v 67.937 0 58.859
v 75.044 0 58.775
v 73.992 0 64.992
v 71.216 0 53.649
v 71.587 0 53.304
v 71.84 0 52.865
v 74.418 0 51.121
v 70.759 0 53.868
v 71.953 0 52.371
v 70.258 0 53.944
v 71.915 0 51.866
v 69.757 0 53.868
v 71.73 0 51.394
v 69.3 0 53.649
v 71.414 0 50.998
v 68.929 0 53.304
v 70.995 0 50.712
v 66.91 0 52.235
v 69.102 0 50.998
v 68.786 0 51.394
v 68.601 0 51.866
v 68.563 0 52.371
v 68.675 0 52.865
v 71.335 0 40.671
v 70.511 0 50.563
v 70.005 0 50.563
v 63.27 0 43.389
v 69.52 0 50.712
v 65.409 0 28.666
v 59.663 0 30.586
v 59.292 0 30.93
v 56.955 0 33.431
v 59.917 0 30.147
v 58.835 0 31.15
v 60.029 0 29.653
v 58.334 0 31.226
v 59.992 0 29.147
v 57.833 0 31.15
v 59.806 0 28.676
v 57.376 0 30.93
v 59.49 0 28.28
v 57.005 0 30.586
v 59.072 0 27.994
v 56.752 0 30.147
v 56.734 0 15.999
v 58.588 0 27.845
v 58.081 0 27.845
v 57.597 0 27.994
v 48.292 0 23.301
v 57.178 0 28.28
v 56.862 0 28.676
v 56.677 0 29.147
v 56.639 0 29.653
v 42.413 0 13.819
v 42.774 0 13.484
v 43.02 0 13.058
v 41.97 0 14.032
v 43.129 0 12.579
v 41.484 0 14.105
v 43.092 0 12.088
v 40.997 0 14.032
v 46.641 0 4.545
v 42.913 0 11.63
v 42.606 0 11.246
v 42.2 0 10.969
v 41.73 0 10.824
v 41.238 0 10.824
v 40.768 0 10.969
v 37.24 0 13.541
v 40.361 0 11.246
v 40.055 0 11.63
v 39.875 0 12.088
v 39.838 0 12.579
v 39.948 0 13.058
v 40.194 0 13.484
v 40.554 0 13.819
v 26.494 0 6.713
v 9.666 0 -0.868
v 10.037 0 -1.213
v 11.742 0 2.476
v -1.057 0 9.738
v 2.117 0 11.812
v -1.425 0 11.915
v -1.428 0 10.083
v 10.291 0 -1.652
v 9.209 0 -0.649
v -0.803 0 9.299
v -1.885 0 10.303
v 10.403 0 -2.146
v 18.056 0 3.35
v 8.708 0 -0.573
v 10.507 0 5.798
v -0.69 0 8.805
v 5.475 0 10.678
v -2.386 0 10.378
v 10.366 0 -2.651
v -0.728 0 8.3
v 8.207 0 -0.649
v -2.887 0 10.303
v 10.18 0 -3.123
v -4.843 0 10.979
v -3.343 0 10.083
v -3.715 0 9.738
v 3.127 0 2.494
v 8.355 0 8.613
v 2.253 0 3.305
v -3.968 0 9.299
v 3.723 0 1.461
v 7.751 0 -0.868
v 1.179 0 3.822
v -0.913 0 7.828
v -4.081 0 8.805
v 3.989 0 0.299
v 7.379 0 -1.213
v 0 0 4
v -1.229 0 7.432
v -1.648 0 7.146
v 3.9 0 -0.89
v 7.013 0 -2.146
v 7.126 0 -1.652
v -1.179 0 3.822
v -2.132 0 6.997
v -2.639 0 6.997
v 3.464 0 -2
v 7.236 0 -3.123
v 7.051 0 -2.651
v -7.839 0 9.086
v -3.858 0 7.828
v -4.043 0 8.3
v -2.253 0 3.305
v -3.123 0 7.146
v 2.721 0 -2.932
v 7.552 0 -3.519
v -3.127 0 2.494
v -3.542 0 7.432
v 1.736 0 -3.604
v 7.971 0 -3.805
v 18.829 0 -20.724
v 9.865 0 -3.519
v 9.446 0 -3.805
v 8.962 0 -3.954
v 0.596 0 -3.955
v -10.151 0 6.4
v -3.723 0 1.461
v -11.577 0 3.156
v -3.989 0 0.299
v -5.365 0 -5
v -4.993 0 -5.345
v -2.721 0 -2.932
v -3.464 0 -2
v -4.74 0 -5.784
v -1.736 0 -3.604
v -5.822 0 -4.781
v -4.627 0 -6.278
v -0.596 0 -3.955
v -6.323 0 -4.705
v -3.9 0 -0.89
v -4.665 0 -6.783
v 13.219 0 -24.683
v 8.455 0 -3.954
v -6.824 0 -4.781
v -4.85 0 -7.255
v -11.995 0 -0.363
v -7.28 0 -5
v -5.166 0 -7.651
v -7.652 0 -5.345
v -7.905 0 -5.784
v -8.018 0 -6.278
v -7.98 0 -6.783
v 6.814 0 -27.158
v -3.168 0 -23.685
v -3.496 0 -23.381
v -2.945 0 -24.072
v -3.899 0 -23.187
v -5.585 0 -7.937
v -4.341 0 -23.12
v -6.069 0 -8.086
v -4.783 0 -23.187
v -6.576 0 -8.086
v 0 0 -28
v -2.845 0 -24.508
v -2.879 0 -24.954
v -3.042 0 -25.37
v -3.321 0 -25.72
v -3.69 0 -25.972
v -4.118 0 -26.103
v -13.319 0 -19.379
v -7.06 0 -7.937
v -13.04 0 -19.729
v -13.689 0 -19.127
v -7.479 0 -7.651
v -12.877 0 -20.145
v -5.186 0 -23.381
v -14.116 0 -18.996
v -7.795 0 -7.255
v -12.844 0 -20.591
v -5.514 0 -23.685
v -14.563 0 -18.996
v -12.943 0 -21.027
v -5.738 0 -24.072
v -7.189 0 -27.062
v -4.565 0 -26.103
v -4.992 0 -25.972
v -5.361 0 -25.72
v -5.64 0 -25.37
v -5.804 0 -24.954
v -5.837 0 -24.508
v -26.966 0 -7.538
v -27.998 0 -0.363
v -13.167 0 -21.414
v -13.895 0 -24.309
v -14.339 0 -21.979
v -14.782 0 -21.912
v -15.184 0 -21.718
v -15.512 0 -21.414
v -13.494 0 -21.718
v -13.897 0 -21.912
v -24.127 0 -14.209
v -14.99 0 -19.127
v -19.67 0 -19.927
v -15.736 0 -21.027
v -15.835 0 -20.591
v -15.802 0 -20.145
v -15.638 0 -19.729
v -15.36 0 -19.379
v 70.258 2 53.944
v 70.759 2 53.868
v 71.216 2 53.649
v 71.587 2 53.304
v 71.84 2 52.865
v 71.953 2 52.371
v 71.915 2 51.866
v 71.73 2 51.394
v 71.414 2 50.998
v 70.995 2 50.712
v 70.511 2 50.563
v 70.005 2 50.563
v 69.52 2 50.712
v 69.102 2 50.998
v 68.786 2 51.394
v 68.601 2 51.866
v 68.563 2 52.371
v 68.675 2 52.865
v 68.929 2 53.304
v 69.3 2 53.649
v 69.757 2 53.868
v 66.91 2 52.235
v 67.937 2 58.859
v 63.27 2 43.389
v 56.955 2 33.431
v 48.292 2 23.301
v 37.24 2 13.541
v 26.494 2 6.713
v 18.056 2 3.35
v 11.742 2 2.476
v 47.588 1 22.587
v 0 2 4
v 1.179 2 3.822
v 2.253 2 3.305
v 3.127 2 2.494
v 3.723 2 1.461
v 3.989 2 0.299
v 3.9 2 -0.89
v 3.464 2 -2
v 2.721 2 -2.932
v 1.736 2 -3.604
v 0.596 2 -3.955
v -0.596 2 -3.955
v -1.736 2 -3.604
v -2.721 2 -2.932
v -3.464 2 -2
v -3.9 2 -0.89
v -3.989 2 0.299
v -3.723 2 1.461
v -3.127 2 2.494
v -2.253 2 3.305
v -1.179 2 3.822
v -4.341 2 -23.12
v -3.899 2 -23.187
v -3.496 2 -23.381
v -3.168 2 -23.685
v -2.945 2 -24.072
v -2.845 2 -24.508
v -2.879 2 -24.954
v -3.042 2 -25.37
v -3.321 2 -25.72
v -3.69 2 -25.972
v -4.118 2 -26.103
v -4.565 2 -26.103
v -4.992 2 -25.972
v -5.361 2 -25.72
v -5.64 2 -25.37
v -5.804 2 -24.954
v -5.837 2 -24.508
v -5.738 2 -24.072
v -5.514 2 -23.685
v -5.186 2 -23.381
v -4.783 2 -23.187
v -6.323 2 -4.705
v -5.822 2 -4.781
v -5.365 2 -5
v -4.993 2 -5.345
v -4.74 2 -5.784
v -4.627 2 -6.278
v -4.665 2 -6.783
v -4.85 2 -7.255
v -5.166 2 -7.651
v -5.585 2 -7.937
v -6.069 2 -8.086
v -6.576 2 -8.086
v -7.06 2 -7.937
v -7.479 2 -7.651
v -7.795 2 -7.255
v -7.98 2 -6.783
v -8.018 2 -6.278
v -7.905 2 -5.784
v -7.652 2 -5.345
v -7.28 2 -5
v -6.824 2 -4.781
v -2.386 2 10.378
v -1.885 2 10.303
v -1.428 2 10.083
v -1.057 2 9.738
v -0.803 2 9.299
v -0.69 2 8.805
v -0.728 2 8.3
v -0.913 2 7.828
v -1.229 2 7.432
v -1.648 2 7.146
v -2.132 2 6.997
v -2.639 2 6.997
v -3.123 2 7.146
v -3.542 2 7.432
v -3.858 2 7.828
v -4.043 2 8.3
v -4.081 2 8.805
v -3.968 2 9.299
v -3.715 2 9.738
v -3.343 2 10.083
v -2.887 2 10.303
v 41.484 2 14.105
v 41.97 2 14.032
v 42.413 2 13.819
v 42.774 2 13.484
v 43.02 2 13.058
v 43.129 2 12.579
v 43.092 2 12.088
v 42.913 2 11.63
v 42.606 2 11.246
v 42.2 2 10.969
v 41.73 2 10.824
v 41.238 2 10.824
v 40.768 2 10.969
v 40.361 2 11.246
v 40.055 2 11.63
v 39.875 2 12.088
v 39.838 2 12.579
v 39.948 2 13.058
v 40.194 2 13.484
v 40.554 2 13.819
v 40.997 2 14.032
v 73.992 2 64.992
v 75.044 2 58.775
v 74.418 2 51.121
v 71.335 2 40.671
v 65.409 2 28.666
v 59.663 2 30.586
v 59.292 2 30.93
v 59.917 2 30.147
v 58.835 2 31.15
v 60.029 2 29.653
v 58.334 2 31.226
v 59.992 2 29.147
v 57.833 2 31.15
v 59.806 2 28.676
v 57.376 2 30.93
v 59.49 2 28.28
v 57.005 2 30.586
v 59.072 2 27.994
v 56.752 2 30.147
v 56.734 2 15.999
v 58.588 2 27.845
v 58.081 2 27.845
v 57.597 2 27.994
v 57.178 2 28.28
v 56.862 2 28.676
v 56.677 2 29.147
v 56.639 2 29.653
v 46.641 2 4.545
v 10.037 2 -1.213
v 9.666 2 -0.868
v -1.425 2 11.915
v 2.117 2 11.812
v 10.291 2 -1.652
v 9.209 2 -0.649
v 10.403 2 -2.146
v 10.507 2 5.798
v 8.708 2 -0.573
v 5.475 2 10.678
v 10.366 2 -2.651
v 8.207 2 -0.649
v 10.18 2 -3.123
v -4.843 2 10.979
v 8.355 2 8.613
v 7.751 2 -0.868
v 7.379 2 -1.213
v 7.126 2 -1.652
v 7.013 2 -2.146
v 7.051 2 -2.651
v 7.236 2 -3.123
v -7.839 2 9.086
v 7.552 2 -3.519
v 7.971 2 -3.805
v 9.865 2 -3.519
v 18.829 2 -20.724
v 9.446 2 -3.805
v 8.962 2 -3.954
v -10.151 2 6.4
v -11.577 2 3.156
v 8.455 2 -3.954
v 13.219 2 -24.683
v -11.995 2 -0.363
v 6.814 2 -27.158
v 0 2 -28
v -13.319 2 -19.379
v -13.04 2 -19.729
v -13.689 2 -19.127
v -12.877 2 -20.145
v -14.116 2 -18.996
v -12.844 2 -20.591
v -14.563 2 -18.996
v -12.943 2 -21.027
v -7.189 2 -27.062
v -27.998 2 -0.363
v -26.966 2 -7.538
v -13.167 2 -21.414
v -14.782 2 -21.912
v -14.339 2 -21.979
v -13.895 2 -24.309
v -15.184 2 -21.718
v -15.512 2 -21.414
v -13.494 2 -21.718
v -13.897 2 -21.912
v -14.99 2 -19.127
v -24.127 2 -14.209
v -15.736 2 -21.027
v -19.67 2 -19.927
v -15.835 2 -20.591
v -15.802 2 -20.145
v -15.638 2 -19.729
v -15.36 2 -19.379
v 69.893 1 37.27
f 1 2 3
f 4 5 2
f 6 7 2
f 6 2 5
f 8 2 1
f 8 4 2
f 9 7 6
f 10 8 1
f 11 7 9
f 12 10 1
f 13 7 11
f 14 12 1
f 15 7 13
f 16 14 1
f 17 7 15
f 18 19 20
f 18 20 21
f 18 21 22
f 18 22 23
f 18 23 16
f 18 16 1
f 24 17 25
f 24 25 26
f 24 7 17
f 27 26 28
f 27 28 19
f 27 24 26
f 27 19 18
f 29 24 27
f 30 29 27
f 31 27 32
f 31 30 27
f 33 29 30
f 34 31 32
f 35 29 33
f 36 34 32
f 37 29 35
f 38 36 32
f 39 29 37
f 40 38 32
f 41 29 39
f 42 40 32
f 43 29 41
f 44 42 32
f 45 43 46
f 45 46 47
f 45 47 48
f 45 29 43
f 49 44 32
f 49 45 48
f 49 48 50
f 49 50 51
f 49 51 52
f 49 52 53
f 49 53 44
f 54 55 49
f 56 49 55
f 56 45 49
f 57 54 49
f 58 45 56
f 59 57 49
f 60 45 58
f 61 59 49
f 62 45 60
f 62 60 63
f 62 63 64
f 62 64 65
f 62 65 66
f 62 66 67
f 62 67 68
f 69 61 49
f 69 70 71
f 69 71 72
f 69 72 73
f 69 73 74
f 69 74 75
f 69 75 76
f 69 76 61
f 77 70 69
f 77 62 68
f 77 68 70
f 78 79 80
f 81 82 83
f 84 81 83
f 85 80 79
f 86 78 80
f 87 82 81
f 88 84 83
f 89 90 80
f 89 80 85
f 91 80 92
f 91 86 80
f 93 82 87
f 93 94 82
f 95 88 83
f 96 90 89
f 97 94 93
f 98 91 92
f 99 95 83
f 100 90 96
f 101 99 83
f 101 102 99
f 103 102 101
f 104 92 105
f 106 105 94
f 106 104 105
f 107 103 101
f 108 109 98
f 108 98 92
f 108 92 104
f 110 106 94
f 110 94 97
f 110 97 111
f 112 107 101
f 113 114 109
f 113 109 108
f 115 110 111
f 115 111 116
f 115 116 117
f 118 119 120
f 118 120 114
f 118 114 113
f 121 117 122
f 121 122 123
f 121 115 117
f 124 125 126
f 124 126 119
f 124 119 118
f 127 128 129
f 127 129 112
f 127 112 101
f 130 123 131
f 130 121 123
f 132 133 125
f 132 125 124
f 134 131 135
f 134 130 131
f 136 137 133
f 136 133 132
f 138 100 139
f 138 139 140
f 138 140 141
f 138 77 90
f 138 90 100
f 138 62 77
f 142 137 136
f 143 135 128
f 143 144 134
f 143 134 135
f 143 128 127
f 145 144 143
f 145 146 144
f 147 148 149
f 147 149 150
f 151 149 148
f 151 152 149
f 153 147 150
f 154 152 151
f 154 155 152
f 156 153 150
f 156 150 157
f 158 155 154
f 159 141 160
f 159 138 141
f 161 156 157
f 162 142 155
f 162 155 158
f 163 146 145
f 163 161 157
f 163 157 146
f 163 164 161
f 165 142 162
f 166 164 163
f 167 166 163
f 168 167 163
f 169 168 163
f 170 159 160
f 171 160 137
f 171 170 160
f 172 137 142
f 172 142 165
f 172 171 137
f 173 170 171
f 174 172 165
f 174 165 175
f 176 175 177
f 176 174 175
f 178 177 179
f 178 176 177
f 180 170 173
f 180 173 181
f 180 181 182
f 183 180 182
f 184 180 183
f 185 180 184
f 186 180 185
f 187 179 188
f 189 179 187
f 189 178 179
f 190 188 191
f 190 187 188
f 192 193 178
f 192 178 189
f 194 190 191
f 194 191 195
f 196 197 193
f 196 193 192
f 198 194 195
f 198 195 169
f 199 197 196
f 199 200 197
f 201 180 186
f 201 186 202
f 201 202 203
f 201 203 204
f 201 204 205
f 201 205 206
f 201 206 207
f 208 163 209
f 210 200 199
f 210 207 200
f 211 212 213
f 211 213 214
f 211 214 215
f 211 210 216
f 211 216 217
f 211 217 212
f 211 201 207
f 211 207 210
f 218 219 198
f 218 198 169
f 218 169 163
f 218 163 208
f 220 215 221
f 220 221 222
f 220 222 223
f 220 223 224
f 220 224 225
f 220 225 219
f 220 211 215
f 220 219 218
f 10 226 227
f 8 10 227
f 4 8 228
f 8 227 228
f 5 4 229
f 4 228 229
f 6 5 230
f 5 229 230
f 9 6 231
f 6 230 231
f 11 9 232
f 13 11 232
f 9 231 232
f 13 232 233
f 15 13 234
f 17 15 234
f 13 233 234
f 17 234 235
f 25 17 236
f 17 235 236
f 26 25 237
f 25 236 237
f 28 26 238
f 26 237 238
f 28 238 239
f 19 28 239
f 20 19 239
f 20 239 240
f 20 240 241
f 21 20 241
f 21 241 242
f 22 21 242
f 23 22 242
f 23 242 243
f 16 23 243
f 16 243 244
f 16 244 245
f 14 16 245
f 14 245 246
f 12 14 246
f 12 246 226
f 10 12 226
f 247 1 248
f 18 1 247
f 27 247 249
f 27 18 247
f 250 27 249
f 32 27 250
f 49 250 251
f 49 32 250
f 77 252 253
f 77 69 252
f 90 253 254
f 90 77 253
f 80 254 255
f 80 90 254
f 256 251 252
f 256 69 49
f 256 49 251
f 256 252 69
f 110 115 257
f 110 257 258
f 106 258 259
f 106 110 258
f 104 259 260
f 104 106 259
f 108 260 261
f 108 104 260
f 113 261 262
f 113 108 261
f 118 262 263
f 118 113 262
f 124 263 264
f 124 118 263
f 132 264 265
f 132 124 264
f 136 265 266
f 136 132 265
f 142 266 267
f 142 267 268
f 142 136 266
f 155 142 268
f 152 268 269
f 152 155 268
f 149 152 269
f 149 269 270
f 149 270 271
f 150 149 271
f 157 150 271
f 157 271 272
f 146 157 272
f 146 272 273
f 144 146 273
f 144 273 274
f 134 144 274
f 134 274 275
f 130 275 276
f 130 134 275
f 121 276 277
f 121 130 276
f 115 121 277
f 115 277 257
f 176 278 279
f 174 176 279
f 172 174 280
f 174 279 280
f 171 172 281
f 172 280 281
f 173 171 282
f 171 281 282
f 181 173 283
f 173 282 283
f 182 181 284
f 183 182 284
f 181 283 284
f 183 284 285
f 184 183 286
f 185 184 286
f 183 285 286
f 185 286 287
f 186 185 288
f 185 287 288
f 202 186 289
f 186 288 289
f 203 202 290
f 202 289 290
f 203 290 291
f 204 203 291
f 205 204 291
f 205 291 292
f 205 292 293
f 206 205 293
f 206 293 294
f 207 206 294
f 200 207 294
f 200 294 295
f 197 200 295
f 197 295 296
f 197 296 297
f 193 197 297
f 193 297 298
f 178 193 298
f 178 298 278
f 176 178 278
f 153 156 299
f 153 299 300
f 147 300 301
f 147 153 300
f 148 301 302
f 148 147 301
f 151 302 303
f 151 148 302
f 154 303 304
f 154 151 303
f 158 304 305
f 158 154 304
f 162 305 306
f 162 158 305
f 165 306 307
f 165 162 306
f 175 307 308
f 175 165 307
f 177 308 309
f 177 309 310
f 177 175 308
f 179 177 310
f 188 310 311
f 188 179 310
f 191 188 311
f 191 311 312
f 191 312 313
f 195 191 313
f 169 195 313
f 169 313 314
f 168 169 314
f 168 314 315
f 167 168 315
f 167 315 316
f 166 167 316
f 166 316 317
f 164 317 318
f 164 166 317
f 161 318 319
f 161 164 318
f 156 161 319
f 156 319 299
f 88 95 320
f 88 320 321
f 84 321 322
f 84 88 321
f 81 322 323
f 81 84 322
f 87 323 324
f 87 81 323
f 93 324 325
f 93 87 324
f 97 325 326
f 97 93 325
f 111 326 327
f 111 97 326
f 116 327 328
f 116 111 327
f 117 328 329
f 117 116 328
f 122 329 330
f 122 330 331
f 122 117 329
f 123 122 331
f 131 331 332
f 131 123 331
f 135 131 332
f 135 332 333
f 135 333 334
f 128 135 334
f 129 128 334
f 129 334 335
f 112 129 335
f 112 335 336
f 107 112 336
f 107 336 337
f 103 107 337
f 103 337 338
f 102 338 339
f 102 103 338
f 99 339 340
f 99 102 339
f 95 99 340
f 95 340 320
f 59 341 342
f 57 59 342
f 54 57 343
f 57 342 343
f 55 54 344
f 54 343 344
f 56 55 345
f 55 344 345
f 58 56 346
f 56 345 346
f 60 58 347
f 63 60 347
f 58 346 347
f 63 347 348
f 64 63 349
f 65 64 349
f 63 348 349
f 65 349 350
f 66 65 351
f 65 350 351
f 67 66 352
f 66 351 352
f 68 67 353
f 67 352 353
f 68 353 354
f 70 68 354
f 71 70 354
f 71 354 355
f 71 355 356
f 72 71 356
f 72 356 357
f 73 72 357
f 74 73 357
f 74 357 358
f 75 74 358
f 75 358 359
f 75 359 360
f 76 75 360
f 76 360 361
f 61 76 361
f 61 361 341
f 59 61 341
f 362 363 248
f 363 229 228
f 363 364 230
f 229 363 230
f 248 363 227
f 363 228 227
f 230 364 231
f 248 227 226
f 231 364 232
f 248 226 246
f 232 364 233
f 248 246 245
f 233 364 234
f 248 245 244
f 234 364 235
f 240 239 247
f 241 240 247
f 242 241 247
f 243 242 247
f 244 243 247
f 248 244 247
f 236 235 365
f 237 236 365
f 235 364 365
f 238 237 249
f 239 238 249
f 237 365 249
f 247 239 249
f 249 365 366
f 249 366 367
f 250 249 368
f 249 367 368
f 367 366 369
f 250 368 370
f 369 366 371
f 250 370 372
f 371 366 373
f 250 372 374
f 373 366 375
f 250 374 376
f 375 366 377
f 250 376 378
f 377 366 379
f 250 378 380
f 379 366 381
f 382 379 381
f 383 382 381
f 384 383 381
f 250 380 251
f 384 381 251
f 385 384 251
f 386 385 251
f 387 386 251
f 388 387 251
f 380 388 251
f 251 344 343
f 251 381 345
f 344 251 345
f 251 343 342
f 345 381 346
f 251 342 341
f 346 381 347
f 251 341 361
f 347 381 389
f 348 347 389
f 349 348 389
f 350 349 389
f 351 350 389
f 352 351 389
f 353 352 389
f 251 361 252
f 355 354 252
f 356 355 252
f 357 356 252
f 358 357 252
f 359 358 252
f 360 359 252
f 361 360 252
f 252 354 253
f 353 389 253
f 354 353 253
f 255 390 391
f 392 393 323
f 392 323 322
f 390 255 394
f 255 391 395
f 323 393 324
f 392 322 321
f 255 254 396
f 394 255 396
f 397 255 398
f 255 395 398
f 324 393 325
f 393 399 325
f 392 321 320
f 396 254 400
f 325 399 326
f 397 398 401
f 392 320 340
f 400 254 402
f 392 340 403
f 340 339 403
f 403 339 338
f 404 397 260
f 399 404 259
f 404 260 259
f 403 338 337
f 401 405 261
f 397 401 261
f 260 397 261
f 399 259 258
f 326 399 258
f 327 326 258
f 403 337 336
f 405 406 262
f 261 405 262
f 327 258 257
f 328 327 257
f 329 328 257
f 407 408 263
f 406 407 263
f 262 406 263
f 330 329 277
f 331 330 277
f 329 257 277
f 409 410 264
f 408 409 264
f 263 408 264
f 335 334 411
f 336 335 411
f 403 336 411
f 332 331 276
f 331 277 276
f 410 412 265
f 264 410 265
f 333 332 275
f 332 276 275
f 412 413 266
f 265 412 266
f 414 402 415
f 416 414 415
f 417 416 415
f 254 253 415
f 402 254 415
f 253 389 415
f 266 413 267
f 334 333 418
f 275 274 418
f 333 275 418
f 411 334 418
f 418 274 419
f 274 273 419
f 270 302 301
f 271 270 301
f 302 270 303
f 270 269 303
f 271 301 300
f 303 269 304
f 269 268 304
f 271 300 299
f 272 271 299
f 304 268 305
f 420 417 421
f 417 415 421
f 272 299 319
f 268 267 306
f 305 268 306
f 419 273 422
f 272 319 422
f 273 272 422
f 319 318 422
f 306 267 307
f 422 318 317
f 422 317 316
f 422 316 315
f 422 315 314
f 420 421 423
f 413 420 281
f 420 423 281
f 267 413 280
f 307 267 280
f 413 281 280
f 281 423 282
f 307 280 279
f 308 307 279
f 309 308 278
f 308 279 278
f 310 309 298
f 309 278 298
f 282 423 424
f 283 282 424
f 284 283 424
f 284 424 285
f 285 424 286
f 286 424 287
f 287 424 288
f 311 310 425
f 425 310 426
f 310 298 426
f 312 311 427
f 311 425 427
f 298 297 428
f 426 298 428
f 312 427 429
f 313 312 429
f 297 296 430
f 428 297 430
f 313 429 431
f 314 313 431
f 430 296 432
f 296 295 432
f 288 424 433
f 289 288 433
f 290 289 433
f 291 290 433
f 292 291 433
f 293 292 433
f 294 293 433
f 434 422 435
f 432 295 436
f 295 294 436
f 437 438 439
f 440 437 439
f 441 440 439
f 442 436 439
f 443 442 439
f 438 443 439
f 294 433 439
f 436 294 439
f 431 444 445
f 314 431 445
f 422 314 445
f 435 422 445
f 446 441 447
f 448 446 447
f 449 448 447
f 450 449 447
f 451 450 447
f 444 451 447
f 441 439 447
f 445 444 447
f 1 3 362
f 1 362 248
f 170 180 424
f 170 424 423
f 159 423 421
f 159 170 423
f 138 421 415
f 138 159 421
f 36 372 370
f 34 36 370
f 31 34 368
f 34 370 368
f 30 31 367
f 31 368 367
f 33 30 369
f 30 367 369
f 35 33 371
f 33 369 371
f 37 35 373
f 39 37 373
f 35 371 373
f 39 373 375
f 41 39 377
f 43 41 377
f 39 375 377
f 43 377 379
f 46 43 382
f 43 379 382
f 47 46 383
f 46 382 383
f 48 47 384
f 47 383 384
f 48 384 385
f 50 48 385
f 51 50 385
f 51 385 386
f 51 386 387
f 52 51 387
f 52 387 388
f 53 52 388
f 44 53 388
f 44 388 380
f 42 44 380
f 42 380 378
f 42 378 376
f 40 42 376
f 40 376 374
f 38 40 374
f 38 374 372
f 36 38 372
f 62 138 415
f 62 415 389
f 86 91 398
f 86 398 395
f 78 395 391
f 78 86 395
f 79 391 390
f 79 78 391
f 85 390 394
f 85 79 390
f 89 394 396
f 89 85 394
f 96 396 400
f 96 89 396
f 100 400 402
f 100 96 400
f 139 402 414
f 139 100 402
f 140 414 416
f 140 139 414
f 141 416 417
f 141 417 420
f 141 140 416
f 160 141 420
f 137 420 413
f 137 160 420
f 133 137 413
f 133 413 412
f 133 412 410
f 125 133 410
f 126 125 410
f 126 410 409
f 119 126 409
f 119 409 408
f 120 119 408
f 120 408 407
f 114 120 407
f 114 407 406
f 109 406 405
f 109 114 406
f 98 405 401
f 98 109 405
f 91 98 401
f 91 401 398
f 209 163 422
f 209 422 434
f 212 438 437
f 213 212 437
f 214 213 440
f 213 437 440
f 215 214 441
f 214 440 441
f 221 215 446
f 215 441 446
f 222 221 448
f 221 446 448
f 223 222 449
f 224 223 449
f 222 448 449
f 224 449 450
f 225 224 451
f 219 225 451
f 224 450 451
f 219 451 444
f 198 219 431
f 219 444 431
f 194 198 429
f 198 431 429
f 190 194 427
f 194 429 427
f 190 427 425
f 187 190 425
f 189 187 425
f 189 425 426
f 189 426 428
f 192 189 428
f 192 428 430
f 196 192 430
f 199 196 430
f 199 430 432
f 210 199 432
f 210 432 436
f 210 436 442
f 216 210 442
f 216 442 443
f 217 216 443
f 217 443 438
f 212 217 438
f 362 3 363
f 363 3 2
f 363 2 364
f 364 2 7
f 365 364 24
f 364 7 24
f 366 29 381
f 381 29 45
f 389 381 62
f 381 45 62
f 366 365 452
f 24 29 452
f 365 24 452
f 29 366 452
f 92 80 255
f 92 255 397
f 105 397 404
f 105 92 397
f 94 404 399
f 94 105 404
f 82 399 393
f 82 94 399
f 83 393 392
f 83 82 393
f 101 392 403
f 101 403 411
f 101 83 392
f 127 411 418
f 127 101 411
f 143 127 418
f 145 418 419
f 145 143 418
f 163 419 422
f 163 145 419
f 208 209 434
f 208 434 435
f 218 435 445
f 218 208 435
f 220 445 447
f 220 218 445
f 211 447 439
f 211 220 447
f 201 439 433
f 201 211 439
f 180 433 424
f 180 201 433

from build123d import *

# Parameters (mm, degrees)
SKETCH_1_R          = 1.7
SKETCH_1_R_2        = 4
EXTRUDE_1_DEPTH     = 2
SKETCH_2_R          = 1.5
SKETCH_2_R_2        = 1.7
SKETCH_2_R_3        = 1.65
CUT_EXTRUDE_2_DEPTH = 100.30986231


with BuildPart() as part:
    # Эскиз1 → Бобышка-Вытянуть1 (new body)
    with BuildSketch(Plane(origin=(0, 0, 0), x_dir=(1, 0, 0), z_dir=(0, 1, 0))):
        with BuildLine():
            Line((-11.994516295, 0.362737998), (-27.997650279, 0.362737998))
            ThreePointArc((-27.997650279, 0.362737998), (-19.670324553, 19.926824433), (0, 28))
            ThreePointArc((0, 28), (10.092907112, 26.117680334), (18.828808684, 20.72380186))
            Line((18.828808684, 20.72380186), (46.640586318, -4.544855106))
            add(Edge.make_bspline(
                [(73.991805315, -64.992405718), (82.088977067, -40.455490793), (46.640586318, -4.544855106)],
                knots=[0.235504237, 0.235504237, 0.235504237, 1.570796327, 1.570796327, 1.570796327], degree=2, weights=[1, 0.785281266, 1]))
            Line((73.991805315, -64.992405718), (67.937451343, -58.859103325))
            add(Edge.make_bspline(
                [(67.937451343, -58.859103325), (68.070075227, -1.227091326), (11.741792344, -2.475946799)],
                knots=[3.541017893, 3.541017893, 3.541017893, 5.906750707, 5.906750707, 5.906750707], degree=2, weights=[1, 0.378272966, 1]))
            ThreePointArc((11.741792344, -2.475946799), (-1.424956207, -11.915095459), (-11.994516295, 0.362737998))
        make_face()
        with Locations(Location((-6.322604321, 6.40505071, 0), (0, 0, 270))):
            Circle(SKETCH_1_R, mode=Mode.SUBTRACT)
        with Locations(Location((0, 0, 0), (0, 0, 270))):
            Circle(SKETCH_1_R_2, mode=Mode.SUBTRACT)
        with Locations(Location((8.708238788, 2.273010605, 0), (0, 0, 270))):
            Circle(SKETCH_1_R, mode=Mode.SUBTRACT)
        with Locations(Location((-2.385634467, -8.678061315, 0), (0, 0, 270))):
            Circle(SKETCH_1_R, mode=Mode.SUBTRACT)
    extrude(amount=EXTRUDE_1_DEPTH)

    # Эскиз2 → Вырез-Вытянуть2 (cut, through all)
    with BuildSketch(Plane(origin=(0, 2, 0), x_dir=(1, 0, 0), z_dir=(0, 1, 0))):
        with Locations(Location((-4.341204442, 24.620193825, 0), (0, 0, 270))):
            Circle(SKETCH_2_R)
        with Locations(Location((-14.339410909, 20.478801107, 0), (0, 0, 90))):
            Circle(SKETCH_2_R)
        with Locations(Location((58.334133011, -29.525755439, 0), (0, 0, 270))):
            Circle(SKETCH_2_R_2)
        with Locations(Location((70.257880668, -52.24397848, 0), (0, 0, 270))):
            Circle(SKETCH_2_R_2)
        with Locations(Location((41.483595962, -12.455488374, 0), (0, 0, 270))):
            Circle(SKETCH_2_R_3)
    extrude(amount=-CUT_EXTRUDE_2_DEPTH, mode=Mode.SUBTRACT)


solid = part.part
